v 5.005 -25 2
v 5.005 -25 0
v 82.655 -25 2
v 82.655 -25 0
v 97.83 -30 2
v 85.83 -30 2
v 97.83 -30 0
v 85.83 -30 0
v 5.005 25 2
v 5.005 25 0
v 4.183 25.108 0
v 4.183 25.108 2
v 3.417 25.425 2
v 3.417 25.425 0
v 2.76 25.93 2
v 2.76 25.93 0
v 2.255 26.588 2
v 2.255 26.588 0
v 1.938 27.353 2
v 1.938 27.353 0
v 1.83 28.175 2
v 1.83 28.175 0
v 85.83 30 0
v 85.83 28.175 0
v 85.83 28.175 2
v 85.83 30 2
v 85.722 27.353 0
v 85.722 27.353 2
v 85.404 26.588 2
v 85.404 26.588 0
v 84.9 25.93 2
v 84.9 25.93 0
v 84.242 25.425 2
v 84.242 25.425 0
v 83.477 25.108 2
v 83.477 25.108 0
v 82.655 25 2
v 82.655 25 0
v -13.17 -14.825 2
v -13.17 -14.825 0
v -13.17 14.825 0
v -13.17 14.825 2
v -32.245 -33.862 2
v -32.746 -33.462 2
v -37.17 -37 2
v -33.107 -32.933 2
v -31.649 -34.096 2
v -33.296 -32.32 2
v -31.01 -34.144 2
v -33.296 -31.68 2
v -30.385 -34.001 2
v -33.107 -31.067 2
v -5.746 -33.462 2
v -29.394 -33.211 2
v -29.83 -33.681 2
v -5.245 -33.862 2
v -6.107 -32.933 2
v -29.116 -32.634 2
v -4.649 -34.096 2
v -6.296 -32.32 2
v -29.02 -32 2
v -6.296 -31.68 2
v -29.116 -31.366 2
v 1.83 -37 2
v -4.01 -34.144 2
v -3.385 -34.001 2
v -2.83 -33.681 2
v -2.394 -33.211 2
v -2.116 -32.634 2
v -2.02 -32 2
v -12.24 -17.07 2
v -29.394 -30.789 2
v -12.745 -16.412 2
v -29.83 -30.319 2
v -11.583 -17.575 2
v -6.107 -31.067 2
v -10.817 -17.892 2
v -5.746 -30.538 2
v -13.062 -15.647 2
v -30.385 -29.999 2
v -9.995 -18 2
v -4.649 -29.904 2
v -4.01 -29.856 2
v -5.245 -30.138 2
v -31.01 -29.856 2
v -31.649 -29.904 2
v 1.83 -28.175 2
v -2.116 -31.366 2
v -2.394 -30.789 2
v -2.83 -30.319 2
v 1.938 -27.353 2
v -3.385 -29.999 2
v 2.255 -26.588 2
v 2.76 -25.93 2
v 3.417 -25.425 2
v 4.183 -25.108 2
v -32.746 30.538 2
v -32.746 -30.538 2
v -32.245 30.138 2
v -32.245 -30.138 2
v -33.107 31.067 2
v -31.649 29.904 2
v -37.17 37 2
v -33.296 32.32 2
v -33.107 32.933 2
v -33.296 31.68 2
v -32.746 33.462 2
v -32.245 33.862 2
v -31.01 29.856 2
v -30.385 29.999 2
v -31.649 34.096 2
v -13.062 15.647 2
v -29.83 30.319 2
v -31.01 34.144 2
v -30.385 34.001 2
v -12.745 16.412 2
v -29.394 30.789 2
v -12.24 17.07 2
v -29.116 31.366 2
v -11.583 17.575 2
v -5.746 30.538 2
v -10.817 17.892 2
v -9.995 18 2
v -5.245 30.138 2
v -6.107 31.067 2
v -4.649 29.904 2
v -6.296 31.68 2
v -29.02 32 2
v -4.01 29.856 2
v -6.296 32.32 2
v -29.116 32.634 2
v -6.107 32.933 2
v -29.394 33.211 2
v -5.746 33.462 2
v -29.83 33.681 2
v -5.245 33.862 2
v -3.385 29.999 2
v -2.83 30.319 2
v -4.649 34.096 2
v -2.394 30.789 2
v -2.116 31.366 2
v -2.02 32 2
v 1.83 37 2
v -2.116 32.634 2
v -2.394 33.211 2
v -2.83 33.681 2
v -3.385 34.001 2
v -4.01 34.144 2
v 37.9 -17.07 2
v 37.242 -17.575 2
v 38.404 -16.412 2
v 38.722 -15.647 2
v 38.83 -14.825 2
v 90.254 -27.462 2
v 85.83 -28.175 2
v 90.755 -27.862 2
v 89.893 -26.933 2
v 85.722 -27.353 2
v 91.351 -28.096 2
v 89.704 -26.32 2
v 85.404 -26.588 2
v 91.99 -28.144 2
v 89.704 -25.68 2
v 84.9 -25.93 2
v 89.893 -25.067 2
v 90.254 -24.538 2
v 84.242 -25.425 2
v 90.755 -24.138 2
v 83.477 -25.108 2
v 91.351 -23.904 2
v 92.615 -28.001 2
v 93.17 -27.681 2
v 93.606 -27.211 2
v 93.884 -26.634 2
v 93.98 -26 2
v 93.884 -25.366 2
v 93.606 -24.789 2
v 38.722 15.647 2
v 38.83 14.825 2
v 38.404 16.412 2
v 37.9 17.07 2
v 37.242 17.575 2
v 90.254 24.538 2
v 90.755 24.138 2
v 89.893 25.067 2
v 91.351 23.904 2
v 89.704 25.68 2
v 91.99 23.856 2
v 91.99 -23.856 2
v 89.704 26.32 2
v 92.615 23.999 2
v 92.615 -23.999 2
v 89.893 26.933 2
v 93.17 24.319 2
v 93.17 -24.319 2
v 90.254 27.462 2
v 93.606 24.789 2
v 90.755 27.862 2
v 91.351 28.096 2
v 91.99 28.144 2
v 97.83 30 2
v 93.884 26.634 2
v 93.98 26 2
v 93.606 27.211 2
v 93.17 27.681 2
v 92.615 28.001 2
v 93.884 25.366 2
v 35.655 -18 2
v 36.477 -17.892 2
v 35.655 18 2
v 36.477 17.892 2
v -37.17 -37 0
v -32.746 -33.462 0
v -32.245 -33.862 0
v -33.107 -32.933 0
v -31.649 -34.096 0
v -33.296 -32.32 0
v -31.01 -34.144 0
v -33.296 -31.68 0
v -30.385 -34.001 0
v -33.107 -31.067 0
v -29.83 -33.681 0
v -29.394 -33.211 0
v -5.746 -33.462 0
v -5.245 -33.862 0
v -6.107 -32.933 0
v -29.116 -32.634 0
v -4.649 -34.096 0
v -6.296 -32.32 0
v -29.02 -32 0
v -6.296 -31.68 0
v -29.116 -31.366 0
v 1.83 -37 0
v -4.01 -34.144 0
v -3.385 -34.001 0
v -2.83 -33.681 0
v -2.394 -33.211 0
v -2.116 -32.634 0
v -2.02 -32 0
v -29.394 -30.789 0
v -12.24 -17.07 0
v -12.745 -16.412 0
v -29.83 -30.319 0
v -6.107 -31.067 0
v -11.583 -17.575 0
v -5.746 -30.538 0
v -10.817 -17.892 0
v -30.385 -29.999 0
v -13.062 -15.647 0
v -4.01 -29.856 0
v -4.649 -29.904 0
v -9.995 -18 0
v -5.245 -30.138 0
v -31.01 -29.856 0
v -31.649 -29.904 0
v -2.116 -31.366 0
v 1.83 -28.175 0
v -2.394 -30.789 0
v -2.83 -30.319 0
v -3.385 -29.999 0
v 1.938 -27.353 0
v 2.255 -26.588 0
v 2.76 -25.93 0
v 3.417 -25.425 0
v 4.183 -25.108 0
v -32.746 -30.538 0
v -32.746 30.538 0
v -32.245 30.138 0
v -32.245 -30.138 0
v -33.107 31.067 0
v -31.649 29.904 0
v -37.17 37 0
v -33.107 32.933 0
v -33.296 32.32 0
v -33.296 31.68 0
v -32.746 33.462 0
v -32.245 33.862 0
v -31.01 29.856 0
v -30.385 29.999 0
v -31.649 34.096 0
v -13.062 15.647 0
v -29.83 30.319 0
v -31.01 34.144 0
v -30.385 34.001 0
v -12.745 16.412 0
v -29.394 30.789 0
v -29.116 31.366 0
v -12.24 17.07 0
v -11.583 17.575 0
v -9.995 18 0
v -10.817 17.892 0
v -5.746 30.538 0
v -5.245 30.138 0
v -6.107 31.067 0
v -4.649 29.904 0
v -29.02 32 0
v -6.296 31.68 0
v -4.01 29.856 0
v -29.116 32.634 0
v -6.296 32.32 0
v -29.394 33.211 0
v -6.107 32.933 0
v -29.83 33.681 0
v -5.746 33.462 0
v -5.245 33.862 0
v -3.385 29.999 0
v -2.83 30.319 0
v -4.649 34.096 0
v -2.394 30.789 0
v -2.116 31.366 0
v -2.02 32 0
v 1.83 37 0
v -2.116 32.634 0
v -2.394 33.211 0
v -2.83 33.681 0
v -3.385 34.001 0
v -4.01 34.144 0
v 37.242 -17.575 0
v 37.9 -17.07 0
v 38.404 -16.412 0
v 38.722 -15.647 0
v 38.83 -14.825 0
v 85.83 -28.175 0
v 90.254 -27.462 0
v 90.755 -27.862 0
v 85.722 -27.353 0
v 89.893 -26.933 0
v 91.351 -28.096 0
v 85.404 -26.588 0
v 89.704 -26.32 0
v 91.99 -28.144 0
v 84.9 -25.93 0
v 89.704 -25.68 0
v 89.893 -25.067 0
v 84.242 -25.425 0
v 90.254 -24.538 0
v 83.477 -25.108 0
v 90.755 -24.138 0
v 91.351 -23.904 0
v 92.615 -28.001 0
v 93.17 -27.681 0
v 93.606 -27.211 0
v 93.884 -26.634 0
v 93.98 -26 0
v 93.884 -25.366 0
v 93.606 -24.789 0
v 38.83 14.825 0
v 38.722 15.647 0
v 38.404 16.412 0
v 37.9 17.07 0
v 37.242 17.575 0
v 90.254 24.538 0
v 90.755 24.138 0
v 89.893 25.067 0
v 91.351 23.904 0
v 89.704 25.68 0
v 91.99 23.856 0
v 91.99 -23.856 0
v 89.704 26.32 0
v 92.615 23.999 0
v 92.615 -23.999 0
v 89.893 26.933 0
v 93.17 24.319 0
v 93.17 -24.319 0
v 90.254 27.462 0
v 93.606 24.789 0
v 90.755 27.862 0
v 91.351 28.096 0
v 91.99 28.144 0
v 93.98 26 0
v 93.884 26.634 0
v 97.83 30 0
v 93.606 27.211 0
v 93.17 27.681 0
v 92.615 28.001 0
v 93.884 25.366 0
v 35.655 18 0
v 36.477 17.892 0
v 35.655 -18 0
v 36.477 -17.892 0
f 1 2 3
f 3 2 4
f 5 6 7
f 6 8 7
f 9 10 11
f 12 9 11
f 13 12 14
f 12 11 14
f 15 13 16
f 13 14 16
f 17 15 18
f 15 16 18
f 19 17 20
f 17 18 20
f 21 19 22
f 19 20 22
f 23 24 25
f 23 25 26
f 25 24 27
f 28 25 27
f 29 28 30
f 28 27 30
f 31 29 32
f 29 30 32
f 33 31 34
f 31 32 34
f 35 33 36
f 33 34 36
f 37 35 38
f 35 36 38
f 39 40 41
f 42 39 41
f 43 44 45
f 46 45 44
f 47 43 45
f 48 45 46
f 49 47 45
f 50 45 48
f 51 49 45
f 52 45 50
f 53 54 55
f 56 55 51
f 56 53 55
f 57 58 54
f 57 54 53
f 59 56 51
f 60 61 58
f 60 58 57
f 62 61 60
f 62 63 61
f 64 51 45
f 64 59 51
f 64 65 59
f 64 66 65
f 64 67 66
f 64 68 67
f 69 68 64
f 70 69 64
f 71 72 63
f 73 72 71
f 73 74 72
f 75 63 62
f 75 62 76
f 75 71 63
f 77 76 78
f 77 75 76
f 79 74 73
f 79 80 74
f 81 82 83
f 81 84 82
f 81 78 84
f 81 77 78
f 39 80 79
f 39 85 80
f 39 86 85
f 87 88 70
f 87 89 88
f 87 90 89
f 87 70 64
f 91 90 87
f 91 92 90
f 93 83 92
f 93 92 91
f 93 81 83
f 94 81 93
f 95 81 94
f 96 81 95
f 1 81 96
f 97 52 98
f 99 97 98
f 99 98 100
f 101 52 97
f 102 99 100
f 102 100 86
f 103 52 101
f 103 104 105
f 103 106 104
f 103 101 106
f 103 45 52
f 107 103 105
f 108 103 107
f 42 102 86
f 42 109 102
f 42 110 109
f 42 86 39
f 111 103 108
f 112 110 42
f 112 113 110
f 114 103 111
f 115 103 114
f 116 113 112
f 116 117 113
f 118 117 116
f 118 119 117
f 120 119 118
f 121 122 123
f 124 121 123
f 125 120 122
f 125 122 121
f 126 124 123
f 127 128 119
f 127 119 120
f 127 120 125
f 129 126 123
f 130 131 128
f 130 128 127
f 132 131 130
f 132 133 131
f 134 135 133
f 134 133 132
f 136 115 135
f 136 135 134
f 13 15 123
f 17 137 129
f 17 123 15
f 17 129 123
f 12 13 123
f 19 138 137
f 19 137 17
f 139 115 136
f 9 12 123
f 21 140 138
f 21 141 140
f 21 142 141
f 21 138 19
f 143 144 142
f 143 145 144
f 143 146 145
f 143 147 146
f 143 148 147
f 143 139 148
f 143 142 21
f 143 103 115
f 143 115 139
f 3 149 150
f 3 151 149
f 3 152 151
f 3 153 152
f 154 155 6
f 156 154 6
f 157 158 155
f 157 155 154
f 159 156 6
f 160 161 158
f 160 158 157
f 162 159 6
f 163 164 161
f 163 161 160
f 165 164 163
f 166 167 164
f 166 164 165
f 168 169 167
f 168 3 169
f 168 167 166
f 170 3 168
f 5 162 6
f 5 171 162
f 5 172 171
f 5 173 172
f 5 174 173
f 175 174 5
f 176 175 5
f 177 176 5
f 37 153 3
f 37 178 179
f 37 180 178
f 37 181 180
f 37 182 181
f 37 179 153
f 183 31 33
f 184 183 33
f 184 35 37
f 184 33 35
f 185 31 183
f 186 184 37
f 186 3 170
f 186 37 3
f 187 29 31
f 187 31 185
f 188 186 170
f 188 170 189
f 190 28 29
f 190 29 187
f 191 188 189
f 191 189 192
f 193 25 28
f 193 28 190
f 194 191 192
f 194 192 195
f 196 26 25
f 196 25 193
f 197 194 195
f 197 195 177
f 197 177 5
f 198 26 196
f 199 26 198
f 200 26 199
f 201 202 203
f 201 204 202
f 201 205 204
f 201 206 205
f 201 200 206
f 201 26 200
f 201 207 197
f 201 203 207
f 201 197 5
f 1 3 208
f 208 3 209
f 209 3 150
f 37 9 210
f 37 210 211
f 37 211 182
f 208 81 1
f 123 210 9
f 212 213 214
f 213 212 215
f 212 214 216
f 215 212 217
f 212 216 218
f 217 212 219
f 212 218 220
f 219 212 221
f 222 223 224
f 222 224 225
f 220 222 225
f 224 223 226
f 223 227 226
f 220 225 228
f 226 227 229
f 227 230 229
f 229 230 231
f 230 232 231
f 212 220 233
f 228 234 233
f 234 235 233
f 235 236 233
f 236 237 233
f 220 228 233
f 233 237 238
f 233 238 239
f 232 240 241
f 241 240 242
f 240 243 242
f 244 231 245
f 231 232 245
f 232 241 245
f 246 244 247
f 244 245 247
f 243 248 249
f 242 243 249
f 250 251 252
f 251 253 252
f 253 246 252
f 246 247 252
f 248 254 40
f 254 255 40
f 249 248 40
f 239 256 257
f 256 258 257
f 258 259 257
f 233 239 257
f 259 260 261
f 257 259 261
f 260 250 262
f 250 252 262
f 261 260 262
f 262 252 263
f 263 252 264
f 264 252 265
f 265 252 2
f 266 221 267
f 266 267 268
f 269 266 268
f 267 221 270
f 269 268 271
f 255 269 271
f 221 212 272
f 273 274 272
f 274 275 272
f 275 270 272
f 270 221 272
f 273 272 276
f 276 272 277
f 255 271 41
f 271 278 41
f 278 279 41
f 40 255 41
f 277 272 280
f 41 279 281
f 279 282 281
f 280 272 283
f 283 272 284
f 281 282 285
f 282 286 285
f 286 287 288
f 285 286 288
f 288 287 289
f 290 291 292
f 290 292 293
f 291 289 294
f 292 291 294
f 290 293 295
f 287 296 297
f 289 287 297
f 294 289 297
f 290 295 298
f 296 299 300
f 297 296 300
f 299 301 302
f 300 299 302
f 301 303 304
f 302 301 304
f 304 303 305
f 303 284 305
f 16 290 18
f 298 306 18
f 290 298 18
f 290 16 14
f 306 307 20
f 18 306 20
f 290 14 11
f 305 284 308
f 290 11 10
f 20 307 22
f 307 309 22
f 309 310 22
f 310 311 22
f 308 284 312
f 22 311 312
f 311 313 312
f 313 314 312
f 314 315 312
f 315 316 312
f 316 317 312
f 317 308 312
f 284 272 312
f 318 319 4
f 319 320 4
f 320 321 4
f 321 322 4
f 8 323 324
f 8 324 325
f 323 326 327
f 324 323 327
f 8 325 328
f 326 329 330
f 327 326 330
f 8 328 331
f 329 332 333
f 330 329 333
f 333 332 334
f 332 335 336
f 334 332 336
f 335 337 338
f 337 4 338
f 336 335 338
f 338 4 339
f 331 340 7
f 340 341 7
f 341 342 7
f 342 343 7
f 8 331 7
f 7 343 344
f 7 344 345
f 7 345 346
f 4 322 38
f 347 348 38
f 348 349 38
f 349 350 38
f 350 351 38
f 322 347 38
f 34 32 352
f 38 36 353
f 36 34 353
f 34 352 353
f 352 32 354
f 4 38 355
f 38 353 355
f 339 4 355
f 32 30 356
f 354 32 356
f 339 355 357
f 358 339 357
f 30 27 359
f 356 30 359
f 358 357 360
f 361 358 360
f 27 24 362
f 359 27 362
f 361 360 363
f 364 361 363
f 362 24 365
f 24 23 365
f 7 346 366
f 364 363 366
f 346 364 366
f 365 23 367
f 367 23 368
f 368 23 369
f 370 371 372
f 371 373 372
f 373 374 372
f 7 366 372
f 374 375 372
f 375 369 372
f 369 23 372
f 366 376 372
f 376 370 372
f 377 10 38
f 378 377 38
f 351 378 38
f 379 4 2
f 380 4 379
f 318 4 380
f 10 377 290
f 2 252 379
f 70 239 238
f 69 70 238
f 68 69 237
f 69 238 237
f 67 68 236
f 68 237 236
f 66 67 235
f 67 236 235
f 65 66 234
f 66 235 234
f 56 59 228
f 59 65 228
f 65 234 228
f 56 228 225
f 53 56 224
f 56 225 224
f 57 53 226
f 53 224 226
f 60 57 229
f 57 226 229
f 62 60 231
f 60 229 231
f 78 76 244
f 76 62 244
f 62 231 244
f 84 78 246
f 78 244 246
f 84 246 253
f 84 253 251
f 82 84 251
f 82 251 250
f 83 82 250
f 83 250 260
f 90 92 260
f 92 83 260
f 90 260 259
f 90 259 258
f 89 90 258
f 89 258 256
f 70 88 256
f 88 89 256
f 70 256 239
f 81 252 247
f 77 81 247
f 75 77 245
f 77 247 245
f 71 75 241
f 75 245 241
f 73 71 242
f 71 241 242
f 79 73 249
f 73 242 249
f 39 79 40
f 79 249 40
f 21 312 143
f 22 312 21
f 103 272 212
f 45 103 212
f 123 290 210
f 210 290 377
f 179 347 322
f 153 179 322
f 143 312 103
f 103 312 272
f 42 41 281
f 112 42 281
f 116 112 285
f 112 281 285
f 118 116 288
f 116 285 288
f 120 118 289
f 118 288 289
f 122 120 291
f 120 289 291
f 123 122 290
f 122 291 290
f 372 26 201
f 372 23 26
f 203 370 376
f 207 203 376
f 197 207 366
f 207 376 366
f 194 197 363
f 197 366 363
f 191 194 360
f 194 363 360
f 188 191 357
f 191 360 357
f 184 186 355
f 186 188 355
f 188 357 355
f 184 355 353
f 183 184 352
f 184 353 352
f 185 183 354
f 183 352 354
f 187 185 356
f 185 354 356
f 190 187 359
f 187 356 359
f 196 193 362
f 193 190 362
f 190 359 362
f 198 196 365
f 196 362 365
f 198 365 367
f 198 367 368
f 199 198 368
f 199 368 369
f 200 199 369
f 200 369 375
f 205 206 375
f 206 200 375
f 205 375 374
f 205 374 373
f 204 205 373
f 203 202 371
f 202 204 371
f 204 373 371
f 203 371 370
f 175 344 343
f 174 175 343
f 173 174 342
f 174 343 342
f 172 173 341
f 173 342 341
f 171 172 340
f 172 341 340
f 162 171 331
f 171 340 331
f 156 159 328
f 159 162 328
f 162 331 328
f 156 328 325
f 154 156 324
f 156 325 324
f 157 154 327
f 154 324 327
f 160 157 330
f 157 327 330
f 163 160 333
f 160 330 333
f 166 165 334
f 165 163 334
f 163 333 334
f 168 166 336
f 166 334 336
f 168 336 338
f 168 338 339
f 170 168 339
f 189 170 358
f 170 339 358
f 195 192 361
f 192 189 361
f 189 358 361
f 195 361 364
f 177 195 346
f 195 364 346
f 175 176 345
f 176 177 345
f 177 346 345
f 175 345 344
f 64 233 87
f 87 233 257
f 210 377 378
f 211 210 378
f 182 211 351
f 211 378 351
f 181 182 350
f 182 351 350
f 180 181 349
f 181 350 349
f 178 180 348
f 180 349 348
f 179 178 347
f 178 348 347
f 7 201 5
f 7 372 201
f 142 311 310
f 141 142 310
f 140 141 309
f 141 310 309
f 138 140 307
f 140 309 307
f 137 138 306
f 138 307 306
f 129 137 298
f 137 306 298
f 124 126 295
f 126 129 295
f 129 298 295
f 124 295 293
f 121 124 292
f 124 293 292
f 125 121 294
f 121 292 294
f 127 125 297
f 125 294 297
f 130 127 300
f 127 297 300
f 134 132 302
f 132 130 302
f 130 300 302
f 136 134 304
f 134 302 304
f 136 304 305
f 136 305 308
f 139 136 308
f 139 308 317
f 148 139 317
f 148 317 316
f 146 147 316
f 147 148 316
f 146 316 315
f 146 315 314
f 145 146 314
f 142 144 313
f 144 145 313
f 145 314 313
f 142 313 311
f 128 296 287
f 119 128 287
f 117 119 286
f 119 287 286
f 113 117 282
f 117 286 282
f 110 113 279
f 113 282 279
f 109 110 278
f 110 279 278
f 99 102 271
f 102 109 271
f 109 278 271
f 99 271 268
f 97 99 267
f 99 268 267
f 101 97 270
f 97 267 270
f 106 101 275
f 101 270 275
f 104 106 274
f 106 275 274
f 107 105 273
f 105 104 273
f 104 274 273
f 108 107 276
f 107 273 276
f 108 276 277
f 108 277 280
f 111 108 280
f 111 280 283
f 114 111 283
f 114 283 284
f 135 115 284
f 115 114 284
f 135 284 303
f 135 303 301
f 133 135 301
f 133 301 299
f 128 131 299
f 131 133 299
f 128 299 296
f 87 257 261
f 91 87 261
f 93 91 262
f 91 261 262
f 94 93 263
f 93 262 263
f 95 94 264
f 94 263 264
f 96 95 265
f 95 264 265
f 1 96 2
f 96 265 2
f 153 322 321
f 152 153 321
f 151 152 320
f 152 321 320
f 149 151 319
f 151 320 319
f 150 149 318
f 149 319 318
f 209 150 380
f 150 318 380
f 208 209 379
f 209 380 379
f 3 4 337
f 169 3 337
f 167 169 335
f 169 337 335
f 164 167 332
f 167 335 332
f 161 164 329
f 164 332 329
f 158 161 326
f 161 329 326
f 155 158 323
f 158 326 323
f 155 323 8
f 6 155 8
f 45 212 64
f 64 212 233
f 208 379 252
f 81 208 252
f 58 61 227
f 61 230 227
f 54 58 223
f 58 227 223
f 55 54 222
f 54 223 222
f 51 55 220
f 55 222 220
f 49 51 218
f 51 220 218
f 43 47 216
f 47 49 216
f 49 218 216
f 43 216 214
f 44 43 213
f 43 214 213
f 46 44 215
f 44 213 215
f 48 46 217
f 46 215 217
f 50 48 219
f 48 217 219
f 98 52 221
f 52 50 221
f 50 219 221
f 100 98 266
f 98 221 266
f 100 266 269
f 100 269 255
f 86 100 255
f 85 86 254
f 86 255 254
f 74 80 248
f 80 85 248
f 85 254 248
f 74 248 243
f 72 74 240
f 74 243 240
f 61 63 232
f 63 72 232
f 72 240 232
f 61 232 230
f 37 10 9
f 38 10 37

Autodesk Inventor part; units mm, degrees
ref_plane "YZ Plane" through (0, 0, 0) normal (1, 0, 0) x (0, 1, 0)
ref_plane "XZ Plane" through (0, 0, 0) normal (0, 1, 0) x (-1, 0, 0)
ref_plane "XY Plane" through (0, 0, 0) normal (0, 0, 1) x (1, 0, 0)
sketch "Sketch1" plane through (0, 0, 0) normal (0, 0, 1) x (1, 0, 0)
  circle A0 centre (91.8298, -26) radius 2.15
  circle A1 centre (91.8298, 26) radius 2.15
  line L0 (1.8298, 37) -> (-37.1702, 37)
  line L1 (-37.1702, 37) -> (-37.1702, -37)
  line L2 (-37.1702, -37) -> (1.8298, -37)
  circle A2 centre (-4.1702, -32) radius 2.15
  circle A3 centre (-31.1702, -32) radius 2.15
  circle A4 centre (-31.1702, 32) radius 2.15
  circle A5 centre (-4.1702, 32) radius 2.15
  line L3 (-9.9952, 18) -> (35.6548, 18)
  line L4 (38.8298, 14.825) -> (38.8298, -14.825)
  line L5 (35.6548, -18) -> (-9.9952, -18)
  line L6 (-13.1702, -14.825) -> (-13.1702, 14.825)
  arc A6 (-9.9952, 18) -> (-13.1702, 14.825) centre (-9.9952, 14.825) ccw
  arc A7 (-13.1702, -14.825) -> (-9.9952, -18) centre (-9.9952, -14.825) ccw
  arc A8 (38.8298, 14.825) -> (35.6548, 18) centre (35.6548, 14.825) ccw
  arc A9 (35.6548, -18) -> (38.8298, -14.825) centre (35.6548, -14.825) ccw
  line L7 (85.8298, 28.175) -> (85.8298, 30)
  line L8 (85.8298, 30) -> (97.8298, 30)
  line L9 (97.8298, 30) -> (97.8298, -30)
  line L10 (85.8298, -28.175) -> (85.8298, -30)
  line L11 (85.8298, -30) -> (97.8298, -30)
  arc A10 (82.6548, 25) -> (85.8298, 28.175) centre (82.6548, 28.175) ccw
  arc A11 (85.8298, -28.175) -> (82.6548, -25) centre (82.6548, -28.175) ccw
  line L12 (1.8298, 37) -> (1.8298, 28.175)
  line L13 (5.0048, 25) -> (82.6548, 25)
  line L14 (1.8298, -37) -> (1.8298, -28.175)
  line L15 (5.0048, -25) -> (82.6548, -25)
  arc A12 (1.8298, 28.175) -> (5.0048, 25) centre (5.0048, 28.175) ccw
  arc A13 (5.0048, -25) -> (1.8298, -28.175) centre (5.0048, -28.175) ccw
  point P0 (0, 0)
  point P1 (85.8298, 26.8)
  dimension "d2" = 4.3
  dimension "d3" = 4.3
  dimension "d20" = 6
  dimension "d21" = 6
  dimension "d23" = 4.3
  dimension "d24" = 4.3
  dimension "d25" = 4.3
  dimension "d26" = 4.3
  dimension "d41" = 3.175
  dimension "d53" = 6
  dimension "d54" = 6
  dimension "d55" = 6
  dimension "d57" = 3.175
  dimension "d63" = 84
  dimension "d64" = 3.175
  dimension "d65" = 3.175
  dimension "d68" = 84
  dimension "d69" = 36
  dimension "d70" = 52
  dimension "d75" = 6
  dimension "d76" = 6
  dimension "d78" = 12
  dimension "d79" = 39
  dimension "d80" = 24
  dimension "d81" = 7
  dimension "d82" = 7
  dimension "d83" = 74
  dimension "d84" = 12
  dimension "d85" = 5
  dimension "d86" = 5
  dimension "d87" = 5
  dimension "d88" = 5
  dimension "d89" = 37
  dimension "d90" = 52
  dimension "d92" = 26
  dimension "d93" = 25
  dimension "d94" = 25
  dimension "d95" = 4
  dimension "d96" = 4
extrude "Extrusion5" add sketch "Sketch1" along normal blind 2
equation "\"d3\" = d2"
equation "\"d20\" = d19"
equation "\"d21\" = d19"
equation "\"d24\" = d23"
equation "\"d25\" = d23"
equation "\"d26\" = d23"
equation "\"d54\" = d53"
equation "\"d55\" = d53"
equation "\"d68\" = d63"
equation "\"d75\" = d19"
equation "\"d76\" = d19"
equation "\"d19\" = 6"
properties part number "bottom support extension"
